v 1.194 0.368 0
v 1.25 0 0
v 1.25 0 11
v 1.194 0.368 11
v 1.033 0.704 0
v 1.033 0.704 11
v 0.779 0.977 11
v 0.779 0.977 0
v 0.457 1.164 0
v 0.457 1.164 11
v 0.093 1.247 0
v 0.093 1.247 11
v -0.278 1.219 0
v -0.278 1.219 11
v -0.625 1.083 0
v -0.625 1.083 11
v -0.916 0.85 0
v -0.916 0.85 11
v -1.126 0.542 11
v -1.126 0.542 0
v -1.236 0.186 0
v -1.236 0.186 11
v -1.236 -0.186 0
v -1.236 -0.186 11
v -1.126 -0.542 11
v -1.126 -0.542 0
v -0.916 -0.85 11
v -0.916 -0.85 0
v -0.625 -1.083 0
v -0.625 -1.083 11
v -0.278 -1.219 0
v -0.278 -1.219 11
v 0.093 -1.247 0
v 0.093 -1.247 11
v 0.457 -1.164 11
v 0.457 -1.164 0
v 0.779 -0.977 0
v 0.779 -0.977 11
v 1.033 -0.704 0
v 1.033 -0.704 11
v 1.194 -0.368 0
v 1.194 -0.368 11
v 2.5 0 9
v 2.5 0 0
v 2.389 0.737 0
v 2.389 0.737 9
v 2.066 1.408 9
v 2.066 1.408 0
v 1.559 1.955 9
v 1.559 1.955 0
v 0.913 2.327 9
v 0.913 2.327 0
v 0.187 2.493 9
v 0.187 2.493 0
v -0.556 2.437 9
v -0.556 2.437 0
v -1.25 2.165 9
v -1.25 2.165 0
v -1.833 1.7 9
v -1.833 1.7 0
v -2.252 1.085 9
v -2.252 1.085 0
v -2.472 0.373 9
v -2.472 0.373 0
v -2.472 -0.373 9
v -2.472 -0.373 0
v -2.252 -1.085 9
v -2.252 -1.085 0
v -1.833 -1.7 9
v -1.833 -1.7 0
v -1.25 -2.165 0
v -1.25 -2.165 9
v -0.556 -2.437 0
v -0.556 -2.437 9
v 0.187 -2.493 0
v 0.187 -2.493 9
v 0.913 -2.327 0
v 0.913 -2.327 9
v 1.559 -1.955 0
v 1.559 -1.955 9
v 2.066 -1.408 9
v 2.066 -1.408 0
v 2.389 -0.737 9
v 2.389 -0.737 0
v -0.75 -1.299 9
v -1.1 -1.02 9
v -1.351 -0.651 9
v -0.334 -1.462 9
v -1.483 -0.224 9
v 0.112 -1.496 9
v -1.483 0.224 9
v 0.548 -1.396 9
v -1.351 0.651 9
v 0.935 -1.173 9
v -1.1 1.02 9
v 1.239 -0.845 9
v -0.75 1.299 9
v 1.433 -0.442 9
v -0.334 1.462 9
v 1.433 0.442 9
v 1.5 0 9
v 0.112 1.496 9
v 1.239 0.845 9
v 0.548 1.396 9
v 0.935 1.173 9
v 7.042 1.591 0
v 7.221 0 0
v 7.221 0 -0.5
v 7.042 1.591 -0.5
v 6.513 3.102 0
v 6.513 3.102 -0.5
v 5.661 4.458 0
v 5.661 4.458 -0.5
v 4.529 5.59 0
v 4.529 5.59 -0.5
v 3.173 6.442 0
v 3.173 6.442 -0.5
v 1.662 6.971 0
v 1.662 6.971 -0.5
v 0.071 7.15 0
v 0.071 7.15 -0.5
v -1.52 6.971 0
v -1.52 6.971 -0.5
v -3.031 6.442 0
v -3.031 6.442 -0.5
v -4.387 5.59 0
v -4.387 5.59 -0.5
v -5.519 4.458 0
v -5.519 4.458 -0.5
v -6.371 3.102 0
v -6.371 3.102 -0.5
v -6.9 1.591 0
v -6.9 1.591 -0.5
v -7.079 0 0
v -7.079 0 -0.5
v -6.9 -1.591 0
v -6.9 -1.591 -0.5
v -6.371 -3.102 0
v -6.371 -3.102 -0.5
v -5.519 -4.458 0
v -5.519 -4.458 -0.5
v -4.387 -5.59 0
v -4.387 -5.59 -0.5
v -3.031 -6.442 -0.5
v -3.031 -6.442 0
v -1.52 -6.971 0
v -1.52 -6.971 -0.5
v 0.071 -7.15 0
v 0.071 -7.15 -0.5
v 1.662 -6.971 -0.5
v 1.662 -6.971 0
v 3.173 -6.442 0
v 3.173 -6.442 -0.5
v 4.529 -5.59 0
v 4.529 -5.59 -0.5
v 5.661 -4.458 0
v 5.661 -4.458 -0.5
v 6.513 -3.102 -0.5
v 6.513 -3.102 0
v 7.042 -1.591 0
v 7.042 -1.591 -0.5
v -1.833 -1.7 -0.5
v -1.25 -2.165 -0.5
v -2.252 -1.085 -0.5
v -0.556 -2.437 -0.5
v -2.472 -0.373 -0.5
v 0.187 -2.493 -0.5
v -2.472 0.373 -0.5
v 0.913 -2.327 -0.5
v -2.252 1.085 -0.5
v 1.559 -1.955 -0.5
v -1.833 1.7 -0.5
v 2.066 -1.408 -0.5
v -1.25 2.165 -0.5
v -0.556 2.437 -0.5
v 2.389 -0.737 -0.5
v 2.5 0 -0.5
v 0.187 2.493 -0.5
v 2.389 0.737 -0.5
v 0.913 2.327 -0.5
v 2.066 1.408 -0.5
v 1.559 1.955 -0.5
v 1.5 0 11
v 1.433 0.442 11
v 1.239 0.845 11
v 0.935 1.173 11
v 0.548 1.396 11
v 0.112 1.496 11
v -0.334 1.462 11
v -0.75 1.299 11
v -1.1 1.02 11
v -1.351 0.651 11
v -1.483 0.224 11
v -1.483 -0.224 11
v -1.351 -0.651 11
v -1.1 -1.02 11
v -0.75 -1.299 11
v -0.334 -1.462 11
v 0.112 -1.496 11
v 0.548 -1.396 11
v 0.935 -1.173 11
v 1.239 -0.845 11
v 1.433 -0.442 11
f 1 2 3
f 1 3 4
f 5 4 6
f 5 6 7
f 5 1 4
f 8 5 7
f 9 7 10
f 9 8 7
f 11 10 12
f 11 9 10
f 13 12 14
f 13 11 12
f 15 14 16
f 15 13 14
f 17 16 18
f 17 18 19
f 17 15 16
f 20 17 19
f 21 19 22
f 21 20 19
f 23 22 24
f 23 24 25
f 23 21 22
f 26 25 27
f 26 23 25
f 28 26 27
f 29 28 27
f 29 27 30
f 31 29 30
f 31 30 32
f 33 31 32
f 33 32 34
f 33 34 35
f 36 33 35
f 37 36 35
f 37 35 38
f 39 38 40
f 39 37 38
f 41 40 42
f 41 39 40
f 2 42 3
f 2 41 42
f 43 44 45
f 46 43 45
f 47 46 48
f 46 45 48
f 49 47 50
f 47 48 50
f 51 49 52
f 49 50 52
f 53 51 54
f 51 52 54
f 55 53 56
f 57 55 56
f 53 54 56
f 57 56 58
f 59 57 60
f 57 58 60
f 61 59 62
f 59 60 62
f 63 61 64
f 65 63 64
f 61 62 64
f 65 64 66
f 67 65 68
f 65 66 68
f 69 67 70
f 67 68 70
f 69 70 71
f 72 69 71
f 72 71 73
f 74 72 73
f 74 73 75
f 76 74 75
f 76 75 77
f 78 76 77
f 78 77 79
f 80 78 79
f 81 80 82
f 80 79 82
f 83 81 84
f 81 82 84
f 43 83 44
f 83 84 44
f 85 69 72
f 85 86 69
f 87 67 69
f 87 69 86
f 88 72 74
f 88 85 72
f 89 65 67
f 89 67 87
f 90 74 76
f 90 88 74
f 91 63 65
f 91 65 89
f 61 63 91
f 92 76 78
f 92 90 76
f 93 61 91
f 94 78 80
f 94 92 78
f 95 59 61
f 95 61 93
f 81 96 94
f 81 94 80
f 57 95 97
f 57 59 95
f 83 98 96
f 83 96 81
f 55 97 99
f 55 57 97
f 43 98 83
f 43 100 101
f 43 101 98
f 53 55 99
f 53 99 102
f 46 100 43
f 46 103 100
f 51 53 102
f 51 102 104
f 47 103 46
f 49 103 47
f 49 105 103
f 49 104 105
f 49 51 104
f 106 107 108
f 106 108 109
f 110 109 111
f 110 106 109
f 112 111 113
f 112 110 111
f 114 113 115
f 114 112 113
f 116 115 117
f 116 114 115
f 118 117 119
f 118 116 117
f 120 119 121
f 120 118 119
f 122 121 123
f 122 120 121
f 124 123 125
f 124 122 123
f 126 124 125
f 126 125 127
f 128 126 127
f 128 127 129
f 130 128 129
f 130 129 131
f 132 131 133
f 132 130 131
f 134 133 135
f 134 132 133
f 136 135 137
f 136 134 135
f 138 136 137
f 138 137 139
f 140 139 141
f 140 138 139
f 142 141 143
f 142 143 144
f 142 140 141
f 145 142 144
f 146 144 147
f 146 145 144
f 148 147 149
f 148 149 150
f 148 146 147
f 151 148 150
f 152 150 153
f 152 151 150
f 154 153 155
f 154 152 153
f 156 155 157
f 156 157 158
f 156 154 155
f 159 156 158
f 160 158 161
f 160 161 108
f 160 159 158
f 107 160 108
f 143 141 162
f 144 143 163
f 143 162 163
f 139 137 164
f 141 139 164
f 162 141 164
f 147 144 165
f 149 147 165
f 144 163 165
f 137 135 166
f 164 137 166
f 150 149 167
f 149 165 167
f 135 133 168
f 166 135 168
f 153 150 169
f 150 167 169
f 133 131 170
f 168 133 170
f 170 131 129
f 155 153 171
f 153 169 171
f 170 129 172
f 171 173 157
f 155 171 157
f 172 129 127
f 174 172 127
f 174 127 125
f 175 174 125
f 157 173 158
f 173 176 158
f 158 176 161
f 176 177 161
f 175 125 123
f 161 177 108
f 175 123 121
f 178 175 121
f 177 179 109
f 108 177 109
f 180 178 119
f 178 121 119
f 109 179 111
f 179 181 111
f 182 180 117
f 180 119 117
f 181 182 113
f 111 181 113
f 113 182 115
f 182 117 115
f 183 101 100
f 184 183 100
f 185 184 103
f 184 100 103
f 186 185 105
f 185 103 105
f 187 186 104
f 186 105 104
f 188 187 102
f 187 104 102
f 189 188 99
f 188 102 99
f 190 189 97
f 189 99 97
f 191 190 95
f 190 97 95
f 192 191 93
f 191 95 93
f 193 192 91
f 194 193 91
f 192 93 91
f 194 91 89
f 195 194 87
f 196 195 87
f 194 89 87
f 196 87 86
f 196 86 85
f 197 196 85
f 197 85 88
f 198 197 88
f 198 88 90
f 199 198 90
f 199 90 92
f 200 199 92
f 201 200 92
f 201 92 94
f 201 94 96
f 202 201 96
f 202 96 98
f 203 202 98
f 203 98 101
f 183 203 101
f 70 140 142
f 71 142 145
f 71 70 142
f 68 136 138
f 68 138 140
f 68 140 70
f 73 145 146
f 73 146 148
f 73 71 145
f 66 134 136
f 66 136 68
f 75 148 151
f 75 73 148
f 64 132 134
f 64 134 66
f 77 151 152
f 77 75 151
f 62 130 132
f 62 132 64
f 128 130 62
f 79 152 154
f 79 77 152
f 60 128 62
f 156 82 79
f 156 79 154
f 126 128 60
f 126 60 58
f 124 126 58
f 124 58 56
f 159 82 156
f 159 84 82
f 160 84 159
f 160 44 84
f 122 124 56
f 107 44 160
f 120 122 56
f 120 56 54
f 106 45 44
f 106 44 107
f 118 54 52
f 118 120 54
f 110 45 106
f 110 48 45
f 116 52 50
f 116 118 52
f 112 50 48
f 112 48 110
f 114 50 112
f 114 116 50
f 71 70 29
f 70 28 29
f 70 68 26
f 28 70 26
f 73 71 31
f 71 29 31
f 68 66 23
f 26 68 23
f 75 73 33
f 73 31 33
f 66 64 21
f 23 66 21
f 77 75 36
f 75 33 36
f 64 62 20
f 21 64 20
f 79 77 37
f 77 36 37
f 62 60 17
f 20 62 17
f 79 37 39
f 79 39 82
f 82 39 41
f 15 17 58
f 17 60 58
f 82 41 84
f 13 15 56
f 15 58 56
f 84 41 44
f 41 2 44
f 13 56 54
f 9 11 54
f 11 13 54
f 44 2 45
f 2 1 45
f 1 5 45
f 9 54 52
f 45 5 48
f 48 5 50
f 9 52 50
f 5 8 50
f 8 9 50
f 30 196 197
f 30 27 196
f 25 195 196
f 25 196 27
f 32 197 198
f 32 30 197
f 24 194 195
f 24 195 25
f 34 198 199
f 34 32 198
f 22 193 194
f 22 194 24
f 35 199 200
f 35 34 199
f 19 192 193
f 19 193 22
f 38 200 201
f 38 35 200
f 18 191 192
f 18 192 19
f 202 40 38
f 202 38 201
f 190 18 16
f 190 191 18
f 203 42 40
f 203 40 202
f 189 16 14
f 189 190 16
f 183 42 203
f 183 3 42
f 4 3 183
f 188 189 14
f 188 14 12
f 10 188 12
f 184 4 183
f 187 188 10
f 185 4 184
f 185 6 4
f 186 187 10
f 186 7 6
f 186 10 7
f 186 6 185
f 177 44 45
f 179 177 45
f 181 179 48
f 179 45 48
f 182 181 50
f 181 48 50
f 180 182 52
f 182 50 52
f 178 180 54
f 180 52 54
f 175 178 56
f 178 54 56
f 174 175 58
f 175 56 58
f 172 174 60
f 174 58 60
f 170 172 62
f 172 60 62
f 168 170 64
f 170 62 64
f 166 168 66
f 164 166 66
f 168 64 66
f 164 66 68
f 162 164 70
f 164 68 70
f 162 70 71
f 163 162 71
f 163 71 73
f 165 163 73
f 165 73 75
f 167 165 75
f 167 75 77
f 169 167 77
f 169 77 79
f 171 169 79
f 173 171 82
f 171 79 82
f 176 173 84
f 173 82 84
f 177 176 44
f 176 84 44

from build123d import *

# Parameters (mm, degrees)
F0_R     = 2.5
F0_R_2   = 1.5
F1_DEPTH = 9
F0_R_3   = 1.25
F2_DEPTH = 11
F0_R_4   = 7.15
F3_DEPTH = 0.5


with BuildPart() as f1:
    # F0 (on Top) → F1 (new body)
    with BuildSketch(Plane.XY):
        Circle(F0_R)
        Circle(F0_R_2, mode=Mode.SUBTRACT)
    extrude(amount=F1_DEPTH)

    # F0 (on Top) → F2 (join)
    with BuildSketch(Plane.XY):
        Circle(F0_R_2)
        Circle(F0_R_3, mode=Mode.SUBTRACT)
    extrude(amount=F2_DEPTH)


with BuildPart() as f3:
    # F0 (on Top) → F3 (new body)
    with BuildSketch(Plane.XY):
        with Locations((0.070876, 0)):
            Circle(F0_R_4)
        Circle(F0_R, mode=Mode.SUBTRACT)
    extrude(amount=-F3_DEPTH)


solid = Compound([f1.part, f3.part])
